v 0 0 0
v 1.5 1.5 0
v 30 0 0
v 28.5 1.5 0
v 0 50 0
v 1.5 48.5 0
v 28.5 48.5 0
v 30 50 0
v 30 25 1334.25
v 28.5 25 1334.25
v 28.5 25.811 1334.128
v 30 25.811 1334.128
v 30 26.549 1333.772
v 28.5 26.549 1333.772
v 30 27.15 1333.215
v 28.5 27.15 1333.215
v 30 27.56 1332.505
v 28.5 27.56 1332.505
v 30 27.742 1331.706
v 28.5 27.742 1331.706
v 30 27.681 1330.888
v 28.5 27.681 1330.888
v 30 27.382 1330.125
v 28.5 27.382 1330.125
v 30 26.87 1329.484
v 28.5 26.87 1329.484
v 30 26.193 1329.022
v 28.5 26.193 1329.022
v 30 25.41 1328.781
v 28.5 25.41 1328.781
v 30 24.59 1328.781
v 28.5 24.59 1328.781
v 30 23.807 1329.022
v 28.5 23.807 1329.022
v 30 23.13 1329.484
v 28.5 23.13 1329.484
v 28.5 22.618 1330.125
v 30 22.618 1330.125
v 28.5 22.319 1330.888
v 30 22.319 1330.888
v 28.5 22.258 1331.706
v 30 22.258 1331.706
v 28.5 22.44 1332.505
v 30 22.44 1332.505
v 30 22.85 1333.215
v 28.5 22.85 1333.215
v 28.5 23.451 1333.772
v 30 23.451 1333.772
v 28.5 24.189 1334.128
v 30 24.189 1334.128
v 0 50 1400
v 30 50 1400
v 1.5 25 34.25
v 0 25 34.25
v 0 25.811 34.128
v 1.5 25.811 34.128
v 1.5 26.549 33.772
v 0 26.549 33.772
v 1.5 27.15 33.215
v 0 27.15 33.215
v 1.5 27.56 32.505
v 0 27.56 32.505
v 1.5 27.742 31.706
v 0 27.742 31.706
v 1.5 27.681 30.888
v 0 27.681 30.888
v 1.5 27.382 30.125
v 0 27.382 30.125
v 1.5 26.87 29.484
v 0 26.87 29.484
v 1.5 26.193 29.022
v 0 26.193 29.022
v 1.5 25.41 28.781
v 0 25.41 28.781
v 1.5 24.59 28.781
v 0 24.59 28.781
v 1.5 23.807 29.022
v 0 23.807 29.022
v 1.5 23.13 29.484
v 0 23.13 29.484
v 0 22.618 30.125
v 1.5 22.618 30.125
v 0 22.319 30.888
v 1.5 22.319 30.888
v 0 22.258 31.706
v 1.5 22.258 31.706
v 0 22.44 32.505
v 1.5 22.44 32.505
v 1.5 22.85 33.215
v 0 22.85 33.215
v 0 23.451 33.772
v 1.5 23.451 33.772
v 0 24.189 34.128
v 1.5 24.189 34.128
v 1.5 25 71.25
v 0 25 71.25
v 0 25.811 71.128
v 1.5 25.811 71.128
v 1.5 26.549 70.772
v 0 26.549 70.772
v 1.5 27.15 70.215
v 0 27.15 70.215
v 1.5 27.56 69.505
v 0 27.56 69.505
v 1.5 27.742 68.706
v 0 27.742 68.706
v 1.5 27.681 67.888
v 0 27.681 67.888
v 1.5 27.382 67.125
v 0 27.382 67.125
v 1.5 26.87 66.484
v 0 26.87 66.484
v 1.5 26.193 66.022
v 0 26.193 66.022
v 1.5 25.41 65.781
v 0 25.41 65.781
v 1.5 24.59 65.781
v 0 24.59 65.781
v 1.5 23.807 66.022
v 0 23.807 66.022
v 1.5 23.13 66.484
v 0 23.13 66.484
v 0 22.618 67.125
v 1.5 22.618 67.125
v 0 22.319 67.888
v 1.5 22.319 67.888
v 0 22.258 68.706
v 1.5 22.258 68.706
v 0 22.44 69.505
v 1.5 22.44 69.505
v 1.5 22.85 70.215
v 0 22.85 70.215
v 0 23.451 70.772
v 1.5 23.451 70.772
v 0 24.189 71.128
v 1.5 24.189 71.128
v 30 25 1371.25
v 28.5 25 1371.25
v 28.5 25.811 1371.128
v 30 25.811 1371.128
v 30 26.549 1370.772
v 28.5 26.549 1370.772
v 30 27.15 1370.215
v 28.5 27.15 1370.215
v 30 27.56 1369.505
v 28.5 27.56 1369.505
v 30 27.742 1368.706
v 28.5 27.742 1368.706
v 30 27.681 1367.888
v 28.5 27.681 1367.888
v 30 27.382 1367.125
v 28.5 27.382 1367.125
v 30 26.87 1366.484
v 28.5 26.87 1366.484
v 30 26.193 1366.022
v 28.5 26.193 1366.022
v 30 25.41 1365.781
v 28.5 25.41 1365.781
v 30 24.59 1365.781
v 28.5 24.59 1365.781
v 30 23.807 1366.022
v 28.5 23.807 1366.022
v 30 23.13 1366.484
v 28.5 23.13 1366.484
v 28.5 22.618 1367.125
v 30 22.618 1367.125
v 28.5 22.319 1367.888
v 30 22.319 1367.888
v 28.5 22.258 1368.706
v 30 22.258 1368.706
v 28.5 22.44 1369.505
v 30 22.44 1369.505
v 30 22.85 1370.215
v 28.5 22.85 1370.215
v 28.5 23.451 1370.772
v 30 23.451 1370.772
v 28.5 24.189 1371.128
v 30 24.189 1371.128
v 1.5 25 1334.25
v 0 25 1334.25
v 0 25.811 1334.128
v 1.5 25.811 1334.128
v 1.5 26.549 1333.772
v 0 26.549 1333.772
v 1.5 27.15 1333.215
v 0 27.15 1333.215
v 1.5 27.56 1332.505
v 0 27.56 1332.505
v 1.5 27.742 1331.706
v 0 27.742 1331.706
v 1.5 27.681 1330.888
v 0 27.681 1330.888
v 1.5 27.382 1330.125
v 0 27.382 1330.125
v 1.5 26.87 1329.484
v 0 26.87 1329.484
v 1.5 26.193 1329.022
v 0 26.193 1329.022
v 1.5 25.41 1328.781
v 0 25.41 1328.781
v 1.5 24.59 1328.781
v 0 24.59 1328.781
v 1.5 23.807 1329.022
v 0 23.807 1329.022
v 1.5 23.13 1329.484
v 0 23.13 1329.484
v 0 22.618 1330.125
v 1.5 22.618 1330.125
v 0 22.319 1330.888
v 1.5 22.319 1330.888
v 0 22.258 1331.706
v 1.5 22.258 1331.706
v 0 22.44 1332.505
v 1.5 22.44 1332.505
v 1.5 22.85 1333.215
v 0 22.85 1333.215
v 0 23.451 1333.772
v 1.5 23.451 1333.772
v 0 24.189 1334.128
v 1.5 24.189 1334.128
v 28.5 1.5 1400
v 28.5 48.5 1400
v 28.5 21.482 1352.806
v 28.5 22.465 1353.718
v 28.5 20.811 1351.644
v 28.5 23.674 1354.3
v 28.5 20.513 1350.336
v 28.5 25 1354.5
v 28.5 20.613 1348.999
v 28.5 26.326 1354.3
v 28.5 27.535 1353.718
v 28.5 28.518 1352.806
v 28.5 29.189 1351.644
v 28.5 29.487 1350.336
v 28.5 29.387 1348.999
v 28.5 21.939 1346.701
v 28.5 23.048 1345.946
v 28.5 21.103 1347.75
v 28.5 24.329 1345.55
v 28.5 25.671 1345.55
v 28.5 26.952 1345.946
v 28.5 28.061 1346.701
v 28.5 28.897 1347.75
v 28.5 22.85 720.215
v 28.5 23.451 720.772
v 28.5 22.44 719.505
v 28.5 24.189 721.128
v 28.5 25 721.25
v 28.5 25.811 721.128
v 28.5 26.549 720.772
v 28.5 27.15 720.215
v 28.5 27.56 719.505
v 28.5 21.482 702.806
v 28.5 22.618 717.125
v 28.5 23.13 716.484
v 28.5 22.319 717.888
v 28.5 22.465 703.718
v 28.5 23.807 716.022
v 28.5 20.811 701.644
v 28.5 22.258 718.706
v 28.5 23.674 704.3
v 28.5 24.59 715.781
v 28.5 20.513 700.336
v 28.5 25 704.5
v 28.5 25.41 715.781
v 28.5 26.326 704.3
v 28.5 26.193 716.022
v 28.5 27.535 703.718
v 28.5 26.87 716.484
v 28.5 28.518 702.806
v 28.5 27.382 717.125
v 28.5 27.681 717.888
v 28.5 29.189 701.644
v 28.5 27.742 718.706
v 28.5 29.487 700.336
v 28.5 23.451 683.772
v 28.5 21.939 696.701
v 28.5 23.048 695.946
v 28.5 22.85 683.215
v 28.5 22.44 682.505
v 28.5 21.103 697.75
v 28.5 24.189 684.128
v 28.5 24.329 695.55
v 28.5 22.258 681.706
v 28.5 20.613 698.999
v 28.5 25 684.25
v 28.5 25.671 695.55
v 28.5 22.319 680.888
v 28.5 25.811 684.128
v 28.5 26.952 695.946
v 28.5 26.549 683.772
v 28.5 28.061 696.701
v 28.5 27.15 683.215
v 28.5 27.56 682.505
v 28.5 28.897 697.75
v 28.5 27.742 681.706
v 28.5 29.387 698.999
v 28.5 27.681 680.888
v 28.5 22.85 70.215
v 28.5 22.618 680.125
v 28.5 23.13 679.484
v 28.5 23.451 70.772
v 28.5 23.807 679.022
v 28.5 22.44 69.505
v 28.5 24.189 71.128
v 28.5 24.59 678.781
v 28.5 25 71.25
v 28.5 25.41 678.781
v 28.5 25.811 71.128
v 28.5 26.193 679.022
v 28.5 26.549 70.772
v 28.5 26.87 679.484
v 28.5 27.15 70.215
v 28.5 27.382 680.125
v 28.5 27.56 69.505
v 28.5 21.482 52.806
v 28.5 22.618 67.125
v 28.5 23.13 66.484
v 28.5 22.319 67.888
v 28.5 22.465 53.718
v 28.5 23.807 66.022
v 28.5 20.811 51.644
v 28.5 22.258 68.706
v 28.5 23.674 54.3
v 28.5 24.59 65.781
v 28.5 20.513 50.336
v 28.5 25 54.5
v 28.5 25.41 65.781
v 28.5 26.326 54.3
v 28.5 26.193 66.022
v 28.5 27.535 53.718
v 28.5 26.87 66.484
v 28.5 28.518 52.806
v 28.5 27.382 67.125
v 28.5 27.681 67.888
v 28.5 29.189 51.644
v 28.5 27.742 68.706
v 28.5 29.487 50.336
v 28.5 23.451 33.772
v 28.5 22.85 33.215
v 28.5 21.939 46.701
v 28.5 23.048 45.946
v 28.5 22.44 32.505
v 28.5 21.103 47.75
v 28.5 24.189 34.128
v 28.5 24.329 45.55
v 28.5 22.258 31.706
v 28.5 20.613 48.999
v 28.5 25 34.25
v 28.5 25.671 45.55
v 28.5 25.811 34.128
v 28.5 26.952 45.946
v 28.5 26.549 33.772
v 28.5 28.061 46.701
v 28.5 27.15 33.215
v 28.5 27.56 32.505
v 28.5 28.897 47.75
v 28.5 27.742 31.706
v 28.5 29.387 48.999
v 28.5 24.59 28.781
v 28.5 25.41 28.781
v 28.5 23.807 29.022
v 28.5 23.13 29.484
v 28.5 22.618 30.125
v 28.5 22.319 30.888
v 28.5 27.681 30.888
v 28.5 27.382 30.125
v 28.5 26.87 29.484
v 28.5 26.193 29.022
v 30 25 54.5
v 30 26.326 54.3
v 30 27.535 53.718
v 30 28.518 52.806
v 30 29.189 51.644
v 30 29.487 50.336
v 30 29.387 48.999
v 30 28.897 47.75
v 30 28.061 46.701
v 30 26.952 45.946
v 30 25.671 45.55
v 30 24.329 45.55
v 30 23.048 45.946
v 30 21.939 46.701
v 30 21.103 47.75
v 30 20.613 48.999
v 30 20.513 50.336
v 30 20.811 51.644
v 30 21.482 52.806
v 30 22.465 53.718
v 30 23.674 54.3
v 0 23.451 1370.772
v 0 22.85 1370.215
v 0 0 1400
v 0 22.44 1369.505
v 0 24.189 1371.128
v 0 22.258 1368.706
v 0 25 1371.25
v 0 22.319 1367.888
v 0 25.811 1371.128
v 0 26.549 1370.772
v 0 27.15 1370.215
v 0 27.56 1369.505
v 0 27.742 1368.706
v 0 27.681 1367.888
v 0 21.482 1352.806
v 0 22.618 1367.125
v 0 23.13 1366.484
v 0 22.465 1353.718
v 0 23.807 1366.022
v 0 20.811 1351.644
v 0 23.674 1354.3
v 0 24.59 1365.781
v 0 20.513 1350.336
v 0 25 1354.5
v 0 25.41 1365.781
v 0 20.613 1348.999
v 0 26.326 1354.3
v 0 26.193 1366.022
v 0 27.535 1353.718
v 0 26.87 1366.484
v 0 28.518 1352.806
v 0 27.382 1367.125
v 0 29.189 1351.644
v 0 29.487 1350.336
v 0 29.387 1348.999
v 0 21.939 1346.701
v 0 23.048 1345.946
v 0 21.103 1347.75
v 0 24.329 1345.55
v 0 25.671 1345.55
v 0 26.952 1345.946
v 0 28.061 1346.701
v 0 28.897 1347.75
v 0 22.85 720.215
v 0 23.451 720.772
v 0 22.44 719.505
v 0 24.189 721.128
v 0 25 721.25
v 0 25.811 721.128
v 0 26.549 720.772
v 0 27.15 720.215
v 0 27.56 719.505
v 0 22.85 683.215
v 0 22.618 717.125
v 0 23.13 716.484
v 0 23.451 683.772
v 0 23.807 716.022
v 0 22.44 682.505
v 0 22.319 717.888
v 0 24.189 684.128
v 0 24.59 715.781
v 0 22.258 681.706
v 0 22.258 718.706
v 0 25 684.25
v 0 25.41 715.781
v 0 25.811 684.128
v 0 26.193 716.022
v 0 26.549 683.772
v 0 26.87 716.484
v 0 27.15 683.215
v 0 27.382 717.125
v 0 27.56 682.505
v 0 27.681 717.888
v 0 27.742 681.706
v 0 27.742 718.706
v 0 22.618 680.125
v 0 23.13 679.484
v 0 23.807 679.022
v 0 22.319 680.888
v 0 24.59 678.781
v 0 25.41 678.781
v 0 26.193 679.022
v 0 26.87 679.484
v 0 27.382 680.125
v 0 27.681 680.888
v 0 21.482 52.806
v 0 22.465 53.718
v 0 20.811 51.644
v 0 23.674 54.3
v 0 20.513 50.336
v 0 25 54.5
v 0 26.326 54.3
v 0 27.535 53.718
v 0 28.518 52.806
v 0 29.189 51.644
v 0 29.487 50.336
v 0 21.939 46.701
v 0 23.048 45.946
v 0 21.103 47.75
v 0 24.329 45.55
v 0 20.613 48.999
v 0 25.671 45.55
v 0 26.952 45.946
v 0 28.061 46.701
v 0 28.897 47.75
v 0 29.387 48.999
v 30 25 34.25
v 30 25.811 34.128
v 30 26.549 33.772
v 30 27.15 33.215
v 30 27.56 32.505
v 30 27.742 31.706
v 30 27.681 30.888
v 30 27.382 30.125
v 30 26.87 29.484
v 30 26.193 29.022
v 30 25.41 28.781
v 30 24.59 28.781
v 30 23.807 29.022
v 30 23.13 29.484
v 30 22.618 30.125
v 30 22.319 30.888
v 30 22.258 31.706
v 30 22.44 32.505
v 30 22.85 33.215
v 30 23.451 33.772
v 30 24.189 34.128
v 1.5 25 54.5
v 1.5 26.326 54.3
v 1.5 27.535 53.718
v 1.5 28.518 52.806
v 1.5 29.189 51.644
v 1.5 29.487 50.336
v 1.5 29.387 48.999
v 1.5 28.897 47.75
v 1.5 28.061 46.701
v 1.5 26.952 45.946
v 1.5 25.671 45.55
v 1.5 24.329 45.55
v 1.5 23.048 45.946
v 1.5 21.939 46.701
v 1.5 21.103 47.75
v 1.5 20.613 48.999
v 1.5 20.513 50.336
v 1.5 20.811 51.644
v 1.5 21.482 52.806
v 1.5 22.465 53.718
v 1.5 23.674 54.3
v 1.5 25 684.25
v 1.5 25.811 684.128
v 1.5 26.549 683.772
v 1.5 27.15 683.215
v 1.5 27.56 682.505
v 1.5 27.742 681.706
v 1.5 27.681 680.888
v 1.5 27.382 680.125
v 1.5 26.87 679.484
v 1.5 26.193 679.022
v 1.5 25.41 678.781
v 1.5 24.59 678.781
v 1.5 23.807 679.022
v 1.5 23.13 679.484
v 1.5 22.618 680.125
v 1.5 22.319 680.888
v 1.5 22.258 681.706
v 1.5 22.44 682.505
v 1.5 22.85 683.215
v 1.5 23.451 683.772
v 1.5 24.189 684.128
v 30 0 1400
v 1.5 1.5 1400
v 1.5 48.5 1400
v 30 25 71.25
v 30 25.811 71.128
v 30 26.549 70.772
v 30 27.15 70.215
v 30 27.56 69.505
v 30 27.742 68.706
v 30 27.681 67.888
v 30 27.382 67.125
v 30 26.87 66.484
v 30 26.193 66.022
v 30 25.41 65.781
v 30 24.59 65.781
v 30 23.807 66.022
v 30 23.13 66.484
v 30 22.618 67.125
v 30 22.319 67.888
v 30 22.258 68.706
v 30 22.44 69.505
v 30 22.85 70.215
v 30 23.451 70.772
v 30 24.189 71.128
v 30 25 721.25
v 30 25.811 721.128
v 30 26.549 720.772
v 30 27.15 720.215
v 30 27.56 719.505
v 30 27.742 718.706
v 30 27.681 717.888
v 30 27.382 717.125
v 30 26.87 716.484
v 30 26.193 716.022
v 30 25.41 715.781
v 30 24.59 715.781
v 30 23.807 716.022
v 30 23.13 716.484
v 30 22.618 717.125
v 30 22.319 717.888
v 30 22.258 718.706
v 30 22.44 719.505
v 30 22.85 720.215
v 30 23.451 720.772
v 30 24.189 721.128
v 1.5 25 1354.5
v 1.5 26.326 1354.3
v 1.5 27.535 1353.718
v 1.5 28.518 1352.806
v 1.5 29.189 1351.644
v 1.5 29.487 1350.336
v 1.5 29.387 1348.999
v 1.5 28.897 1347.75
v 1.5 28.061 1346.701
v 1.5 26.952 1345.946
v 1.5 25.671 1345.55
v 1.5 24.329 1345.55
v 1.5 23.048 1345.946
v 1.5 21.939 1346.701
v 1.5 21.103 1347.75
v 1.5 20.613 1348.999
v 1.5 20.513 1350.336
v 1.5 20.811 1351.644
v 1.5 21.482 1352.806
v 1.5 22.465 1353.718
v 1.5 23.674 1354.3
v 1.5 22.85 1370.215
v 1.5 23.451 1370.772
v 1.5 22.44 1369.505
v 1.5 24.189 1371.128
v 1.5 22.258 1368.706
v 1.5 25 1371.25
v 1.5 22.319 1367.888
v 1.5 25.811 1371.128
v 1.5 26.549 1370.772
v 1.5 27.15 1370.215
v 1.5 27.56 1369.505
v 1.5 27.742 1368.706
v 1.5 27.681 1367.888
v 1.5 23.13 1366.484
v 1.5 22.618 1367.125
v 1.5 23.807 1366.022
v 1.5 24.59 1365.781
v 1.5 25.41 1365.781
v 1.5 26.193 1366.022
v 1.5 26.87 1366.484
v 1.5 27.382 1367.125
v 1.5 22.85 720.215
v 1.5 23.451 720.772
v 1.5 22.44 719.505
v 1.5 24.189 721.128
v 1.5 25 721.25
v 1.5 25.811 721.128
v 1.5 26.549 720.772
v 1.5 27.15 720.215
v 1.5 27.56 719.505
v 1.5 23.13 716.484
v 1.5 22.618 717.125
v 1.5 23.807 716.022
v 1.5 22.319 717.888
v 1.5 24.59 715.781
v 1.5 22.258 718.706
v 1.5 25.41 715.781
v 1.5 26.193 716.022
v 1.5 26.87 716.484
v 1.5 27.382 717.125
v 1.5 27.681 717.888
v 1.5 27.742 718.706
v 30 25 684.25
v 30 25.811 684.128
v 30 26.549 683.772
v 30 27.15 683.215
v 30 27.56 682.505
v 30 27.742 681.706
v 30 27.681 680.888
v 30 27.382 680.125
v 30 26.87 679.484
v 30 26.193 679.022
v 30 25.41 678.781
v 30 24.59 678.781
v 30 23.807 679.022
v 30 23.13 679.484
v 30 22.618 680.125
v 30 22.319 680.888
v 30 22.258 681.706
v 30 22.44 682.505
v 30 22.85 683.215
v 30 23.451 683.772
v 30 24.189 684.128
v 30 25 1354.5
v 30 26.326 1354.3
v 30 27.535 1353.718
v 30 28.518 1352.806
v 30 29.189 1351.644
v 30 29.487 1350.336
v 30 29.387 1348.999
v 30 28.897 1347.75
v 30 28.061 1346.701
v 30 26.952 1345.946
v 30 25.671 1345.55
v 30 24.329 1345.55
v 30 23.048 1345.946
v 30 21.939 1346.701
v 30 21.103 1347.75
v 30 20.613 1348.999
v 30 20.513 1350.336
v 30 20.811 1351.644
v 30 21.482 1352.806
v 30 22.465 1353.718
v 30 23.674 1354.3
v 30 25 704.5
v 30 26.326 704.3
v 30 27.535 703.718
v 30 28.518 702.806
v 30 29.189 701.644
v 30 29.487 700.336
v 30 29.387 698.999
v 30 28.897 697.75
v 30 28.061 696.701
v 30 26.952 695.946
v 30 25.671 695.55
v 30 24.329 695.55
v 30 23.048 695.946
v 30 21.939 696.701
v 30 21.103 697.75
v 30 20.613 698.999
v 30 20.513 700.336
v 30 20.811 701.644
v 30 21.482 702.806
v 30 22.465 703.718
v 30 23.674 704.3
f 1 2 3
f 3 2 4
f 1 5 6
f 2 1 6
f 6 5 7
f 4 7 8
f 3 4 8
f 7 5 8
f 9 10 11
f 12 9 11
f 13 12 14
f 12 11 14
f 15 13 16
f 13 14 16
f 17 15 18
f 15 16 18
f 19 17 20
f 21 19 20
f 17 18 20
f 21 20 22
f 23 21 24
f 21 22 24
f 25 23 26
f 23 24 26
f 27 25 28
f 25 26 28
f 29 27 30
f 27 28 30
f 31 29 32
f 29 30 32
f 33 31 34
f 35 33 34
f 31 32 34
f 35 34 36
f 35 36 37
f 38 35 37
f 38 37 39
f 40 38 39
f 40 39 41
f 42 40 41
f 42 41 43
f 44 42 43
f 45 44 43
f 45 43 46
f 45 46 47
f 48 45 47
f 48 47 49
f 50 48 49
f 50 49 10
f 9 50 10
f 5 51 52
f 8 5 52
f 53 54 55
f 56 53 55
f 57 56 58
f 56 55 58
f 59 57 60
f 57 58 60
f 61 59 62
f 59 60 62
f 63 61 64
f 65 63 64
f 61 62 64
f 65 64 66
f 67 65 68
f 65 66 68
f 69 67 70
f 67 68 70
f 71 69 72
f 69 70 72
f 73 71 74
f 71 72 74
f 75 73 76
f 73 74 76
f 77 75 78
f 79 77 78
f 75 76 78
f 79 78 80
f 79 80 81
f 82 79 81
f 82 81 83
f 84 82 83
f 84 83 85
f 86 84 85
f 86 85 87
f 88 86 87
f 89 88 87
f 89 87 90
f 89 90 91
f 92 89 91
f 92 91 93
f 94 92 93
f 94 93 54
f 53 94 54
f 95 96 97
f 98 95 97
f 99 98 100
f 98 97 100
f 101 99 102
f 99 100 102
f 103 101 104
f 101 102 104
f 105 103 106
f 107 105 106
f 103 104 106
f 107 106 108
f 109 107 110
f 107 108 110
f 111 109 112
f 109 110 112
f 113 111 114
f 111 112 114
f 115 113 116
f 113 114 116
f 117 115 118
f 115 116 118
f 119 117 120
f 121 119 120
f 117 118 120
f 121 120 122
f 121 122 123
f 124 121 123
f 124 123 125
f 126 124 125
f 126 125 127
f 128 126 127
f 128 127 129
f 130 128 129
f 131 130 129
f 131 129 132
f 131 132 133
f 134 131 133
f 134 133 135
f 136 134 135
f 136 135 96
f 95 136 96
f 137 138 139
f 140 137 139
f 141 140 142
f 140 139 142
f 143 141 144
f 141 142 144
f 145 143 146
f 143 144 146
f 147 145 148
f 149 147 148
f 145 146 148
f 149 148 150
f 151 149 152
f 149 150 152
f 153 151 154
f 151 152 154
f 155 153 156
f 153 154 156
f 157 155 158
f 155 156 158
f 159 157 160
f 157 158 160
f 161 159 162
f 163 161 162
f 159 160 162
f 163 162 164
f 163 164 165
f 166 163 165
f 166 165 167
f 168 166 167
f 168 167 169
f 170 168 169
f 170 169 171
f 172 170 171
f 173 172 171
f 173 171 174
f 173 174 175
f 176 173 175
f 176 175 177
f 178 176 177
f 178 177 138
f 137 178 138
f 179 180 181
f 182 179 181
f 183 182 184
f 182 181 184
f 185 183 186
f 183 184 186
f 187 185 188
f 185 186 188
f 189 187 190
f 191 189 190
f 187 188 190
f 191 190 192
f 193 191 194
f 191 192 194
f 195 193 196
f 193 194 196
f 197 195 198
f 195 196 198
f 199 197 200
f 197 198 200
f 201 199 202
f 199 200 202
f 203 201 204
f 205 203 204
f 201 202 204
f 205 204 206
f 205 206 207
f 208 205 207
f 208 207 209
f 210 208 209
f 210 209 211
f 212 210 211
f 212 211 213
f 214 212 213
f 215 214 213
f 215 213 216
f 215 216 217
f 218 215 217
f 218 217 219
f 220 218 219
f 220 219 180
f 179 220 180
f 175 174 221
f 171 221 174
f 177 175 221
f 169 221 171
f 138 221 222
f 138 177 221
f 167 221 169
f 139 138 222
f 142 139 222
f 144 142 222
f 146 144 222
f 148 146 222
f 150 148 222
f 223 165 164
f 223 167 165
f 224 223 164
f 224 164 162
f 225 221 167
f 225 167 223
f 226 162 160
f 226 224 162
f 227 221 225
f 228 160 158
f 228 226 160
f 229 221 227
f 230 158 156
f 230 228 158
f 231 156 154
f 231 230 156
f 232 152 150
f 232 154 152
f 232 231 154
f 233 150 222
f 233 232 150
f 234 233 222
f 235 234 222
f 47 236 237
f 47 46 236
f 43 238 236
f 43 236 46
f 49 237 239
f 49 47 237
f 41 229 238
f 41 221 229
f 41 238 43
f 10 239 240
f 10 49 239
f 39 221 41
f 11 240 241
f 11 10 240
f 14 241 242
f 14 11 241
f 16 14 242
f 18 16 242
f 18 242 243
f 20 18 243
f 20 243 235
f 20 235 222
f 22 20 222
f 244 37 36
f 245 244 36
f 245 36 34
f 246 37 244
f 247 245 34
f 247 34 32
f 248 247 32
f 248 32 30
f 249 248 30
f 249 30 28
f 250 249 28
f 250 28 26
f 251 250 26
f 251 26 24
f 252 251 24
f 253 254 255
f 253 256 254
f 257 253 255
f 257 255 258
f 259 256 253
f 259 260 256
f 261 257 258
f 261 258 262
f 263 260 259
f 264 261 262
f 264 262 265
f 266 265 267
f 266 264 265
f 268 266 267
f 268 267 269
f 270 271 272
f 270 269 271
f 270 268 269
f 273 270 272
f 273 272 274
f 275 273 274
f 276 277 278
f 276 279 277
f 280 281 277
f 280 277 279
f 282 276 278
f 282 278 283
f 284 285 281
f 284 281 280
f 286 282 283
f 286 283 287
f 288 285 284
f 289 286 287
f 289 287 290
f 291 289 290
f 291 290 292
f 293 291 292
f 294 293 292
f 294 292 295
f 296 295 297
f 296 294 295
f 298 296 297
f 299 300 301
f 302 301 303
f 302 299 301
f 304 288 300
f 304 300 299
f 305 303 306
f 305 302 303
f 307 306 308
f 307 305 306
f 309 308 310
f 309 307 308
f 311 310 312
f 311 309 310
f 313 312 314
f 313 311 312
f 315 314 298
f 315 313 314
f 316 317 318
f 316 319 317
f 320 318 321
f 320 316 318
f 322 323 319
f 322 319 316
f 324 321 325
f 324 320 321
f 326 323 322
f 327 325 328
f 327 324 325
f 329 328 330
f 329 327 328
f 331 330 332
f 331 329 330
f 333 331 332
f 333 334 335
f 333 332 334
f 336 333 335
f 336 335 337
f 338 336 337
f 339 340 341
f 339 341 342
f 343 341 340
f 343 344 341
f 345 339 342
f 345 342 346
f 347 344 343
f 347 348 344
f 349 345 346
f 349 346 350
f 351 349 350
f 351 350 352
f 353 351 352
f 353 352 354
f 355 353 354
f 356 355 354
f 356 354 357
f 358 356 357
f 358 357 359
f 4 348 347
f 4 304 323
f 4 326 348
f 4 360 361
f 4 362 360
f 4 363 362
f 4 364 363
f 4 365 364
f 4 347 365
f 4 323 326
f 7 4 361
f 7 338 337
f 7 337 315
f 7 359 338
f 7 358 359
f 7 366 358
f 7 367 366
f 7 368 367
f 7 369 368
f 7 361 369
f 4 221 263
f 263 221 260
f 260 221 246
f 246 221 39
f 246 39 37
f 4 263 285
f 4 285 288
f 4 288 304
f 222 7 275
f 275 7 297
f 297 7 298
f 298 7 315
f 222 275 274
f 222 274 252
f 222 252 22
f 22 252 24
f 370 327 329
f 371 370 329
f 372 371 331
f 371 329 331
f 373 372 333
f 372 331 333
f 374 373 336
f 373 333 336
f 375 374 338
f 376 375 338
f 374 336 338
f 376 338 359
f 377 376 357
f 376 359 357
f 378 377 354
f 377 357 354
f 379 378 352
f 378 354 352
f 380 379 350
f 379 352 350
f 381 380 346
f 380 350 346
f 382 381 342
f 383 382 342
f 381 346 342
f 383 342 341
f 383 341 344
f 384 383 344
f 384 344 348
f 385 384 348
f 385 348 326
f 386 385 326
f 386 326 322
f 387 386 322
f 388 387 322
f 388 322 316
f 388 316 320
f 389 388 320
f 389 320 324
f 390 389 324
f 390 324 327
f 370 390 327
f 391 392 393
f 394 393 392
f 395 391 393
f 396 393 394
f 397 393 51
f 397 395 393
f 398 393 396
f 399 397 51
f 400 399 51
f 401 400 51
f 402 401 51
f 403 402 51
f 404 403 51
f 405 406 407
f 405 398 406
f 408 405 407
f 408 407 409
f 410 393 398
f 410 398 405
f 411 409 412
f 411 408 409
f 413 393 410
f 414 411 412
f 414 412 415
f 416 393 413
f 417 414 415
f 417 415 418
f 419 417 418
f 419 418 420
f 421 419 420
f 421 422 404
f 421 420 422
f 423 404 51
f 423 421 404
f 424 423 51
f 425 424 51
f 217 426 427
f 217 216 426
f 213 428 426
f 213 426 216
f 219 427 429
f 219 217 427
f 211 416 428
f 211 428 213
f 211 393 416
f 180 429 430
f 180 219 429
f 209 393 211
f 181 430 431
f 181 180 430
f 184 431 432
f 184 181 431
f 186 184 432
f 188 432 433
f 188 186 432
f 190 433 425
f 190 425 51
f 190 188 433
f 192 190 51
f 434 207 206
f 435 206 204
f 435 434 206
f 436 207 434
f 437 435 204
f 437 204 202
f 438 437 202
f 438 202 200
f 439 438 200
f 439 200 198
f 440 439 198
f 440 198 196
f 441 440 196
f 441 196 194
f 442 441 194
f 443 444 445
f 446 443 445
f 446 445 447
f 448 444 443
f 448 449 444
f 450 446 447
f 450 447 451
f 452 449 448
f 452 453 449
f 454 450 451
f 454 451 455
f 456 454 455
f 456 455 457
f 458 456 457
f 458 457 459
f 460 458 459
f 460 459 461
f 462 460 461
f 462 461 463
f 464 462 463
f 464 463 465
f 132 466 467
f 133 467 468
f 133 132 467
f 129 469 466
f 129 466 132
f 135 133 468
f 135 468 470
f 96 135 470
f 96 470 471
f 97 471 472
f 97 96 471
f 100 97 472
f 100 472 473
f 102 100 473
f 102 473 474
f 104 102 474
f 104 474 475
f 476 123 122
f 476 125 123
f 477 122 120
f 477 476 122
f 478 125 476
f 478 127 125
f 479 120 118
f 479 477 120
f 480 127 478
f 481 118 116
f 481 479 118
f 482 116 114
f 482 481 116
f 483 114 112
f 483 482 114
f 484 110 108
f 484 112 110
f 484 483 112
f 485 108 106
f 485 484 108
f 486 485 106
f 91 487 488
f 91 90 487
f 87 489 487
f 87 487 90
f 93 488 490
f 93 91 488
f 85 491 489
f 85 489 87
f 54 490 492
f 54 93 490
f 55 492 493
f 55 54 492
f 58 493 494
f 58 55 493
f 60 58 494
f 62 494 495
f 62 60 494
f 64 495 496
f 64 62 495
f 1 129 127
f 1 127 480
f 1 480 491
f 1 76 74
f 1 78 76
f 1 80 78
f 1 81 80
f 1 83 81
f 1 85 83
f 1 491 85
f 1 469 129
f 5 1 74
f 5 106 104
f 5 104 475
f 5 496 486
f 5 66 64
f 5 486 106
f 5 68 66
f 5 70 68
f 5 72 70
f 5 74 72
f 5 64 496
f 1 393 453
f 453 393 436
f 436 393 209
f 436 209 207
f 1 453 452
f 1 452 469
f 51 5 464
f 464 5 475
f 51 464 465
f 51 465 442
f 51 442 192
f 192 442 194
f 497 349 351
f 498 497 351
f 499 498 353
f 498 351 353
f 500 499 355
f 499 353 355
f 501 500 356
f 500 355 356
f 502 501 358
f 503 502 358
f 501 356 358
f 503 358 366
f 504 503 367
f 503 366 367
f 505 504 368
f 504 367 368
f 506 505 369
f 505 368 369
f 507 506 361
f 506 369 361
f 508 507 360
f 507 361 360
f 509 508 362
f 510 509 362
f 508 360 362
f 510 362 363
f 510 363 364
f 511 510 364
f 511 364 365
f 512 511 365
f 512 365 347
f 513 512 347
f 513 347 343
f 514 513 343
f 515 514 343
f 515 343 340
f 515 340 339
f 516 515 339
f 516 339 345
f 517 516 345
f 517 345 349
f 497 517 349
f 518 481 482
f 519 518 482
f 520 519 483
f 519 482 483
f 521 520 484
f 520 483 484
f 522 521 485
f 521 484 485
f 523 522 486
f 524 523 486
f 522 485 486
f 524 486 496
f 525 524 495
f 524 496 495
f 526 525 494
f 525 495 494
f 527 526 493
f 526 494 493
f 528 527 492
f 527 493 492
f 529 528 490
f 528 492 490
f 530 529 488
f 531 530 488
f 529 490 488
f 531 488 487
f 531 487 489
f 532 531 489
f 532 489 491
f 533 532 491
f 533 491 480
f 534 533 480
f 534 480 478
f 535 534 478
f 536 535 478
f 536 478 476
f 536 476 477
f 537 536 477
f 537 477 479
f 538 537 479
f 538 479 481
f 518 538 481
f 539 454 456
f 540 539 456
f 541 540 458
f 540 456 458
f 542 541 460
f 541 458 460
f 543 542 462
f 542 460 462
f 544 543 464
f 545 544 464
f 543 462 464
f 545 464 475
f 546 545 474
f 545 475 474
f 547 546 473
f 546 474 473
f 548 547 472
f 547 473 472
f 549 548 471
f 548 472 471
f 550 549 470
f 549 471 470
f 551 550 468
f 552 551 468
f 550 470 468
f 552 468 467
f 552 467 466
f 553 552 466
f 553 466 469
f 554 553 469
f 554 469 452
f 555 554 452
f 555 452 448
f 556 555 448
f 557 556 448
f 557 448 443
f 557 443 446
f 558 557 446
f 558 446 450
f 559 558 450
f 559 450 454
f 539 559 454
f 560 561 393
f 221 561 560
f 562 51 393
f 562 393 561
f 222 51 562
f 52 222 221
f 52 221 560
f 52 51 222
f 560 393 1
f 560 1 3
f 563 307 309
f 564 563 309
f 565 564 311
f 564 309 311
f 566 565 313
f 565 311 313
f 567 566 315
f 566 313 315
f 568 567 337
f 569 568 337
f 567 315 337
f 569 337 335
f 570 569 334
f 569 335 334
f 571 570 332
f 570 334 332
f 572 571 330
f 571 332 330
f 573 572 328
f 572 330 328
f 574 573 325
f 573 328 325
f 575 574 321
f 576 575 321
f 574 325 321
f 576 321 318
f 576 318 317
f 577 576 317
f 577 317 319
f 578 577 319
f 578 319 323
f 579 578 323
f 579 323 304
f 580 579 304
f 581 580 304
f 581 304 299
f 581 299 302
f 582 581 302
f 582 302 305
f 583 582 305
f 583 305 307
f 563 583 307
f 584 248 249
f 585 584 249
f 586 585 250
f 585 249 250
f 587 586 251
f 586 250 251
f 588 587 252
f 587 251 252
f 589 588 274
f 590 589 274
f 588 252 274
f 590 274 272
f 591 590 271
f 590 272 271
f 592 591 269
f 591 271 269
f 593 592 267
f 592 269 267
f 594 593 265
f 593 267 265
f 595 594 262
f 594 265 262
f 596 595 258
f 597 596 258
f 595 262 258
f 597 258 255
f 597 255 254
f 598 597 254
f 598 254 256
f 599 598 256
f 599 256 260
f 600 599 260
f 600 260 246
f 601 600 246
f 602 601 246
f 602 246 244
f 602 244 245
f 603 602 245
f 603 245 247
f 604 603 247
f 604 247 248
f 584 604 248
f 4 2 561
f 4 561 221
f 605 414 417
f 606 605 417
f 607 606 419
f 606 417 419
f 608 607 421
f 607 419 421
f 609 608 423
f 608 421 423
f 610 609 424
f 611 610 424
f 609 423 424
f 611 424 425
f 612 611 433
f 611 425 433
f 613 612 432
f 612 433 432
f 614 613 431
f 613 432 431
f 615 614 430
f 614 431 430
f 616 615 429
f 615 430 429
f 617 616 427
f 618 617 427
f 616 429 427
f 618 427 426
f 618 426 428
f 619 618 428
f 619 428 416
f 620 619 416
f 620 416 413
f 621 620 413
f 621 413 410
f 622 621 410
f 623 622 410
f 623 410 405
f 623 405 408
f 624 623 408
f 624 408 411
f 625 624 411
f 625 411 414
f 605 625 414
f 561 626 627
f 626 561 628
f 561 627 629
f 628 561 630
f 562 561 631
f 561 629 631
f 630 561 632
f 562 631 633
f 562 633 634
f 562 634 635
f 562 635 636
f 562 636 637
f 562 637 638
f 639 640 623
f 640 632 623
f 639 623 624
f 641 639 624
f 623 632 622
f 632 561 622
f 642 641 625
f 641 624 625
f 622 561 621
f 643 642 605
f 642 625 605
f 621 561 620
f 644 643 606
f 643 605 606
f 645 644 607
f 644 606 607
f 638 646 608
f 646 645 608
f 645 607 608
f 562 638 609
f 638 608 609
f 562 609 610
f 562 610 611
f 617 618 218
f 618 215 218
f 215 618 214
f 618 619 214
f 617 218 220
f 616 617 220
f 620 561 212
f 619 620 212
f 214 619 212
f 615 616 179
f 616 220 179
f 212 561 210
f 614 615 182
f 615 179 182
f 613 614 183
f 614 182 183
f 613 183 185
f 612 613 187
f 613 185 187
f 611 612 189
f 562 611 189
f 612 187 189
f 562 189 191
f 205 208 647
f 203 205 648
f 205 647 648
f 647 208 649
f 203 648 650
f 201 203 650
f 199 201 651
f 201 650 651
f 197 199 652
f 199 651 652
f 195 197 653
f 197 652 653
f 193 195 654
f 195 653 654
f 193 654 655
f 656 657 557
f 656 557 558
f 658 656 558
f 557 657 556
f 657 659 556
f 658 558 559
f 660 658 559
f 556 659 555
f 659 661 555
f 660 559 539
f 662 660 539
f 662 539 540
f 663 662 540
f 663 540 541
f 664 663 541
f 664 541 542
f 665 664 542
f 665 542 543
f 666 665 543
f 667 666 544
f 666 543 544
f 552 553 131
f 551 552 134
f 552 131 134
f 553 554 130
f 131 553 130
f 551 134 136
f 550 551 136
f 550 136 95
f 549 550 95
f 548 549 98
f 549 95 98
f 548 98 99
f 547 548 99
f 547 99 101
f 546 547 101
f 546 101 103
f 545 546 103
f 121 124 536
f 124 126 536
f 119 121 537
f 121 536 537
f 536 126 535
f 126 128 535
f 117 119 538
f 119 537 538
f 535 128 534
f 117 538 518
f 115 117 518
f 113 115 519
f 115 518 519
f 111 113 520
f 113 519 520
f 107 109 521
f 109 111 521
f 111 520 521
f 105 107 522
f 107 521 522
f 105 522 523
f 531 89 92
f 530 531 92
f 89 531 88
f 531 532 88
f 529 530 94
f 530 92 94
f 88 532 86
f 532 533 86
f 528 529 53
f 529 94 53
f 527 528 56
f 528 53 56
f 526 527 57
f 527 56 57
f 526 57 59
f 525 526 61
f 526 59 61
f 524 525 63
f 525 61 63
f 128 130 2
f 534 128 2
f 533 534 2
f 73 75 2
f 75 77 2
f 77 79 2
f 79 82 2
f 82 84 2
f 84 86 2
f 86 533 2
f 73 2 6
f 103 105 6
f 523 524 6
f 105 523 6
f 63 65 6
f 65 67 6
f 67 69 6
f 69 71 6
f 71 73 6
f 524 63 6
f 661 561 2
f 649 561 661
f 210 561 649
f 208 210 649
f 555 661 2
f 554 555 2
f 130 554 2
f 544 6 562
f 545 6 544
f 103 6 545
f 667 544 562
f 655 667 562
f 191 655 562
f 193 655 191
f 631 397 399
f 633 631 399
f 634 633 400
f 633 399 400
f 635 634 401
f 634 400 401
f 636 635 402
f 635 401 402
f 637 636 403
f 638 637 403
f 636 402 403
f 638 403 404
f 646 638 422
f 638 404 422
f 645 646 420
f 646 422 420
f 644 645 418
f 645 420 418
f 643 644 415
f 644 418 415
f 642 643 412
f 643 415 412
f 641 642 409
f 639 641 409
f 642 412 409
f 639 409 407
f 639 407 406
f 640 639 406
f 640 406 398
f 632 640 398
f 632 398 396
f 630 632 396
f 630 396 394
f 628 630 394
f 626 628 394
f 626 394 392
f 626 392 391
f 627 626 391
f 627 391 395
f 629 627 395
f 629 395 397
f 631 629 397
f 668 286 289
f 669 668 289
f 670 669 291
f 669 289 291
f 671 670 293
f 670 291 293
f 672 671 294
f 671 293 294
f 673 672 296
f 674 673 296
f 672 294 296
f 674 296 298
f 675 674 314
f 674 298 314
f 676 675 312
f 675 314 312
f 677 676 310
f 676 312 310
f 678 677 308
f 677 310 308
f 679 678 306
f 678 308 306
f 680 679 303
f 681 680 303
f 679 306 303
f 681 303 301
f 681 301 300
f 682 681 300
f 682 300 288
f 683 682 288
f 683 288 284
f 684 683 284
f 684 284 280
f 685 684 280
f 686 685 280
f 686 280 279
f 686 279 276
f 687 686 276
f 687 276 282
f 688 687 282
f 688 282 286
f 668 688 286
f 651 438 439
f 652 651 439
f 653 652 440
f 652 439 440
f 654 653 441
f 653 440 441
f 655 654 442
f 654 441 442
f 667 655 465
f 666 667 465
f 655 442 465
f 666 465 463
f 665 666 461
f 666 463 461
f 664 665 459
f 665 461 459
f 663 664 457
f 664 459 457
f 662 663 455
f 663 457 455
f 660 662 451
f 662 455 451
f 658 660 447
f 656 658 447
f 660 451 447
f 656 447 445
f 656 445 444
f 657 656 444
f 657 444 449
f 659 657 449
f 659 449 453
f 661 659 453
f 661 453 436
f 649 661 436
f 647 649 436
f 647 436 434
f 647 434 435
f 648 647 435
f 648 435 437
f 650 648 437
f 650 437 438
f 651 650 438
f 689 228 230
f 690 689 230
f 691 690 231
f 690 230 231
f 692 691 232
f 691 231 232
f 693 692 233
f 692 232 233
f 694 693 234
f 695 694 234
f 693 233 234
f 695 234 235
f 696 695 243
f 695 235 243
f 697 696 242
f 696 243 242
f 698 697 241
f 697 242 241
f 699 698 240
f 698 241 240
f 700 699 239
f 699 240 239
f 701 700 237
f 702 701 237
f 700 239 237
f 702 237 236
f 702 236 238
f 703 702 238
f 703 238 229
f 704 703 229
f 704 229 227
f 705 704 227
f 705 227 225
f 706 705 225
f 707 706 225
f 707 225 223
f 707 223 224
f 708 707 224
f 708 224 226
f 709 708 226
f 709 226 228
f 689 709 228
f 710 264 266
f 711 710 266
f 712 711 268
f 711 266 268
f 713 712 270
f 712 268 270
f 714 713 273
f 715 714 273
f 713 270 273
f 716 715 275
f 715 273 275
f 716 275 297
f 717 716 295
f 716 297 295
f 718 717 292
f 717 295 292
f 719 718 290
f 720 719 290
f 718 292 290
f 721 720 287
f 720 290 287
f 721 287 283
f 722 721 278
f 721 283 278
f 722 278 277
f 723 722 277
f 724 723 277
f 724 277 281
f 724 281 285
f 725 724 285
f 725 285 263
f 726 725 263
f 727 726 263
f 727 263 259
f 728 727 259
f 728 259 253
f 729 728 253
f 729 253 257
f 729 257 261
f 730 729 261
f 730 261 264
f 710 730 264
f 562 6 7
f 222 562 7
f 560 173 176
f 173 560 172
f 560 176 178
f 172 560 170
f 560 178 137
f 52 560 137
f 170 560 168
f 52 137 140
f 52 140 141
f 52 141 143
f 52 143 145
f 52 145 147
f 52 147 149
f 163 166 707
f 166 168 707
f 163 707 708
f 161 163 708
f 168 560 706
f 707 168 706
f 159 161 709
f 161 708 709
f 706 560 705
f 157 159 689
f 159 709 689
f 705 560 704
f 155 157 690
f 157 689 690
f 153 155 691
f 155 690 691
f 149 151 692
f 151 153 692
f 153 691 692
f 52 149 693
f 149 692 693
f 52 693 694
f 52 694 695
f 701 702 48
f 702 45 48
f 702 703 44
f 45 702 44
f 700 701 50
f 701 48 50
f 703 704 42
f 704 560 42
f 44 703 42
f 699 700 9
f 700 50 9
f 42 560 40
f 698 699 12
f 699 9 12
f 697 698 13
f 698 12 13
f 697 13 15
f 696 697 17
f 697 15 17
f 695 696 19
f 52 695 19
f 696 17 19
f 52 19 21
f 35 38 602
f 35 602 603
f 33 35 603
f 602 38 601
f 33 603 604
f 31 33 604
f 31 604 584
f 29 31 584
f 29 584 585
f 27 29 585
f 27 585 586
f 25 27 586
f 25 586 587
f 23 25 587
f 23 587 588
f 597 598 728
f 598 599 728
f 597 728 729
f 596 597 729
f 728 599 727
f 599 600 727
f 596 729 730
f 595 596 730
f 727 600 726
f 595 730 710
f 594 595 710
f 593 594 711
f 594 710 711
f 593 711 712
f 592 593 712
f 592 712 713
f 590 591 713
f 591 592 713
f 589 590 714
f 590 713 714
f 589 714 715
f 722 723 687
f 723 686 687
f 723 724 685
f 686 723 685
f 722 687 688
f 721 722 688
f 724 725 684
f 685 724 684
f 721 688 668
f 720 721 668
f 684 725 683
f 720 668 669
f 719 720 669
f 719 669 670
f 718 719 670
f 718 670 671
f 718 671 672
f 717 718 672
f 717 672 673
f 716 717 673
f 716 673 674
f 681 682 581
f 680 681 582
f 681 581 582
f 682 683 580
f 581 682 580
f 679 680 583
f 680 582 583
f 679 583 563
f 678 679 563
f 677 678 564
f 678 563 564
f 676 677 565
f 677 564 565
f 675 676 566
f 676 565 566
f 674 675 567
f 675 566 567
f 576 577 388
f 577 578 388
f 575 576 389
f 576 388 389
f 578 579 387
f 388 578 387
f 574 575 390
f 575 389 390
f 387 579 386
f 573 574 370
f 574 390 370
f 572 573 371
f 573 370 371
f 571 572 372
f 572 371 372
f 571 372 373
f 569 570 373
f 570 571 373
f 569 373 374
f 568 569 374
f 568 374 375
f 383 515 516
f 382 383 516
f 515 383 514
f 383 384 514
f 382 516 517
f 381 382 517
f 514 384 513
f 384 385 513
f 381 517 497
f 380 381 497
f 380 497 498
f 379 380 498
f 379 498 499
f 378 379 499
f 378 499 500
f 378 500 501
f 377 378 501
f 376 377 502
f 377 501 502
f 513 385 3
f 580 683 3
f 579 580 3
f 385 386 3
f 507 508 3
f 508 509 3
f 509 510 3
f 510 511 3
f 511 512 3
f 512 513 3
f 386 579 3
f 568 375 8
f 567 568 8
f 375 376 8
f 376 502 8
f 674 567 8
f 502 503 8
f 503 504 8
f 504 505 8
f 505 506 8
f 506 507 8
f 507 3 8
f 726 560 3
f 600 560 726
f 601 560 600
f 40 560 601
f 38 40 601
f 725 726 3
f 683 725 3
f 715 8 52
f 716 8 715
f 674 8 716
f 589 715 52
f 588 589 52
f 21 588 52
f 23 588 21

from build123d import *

# Parameters (mm, degrees)
ESBO_O1_W                   = 30
ESBO_O1_H                   = 50
ESBO_O1_W_2                 = 27
ESBO_O1_H_2                 = 47
RESSALTO_EXTRUS_O1_DEPTH    = 1400
FURO_COM_FOLGA_DE_M52_D     = 5.5
FURO_COM_FOLGA_DE_M81_D     = 9
FURO_COM_FOLGA_DE_M84_D     = 9
FURO_COM_FOLGA_DE_M84_DEPTH = 1.5


with BuildPart() as part:
    # Esboço1 → Ressalto-extrusão1 (new body)
    with BuildSketch(Plane.XY):
        with Locations((15, 25)):
            Rectangle(ESBO_O1_W, ESBO_O1_H)
        with Locations((15, 25)):
            Rectangle(ESBO_O1_W_2, ESBO_O1_H_2, mode=Mode.SUBTRACT)
    extrude(amount=RESSALTO_EXTRUS_O1_DEPTH)

    # Furo com folga de M52 (through all)
    with Locations(Plane(origin=(30, 0, 0), x_dir=(0, 0, -1), z_dir=(1, 0, 0))):
        with Locations((-1368.5, 25), (-1331.5, 25), (-68.5, 25), (-31.5, 25), (-718.5, 25), (-681.5, 25)):
            Hole(FURO_COM_FOLGA_DE_M52_D / 2)

    # Furo com folga de M81 (through all)
    with Locations(Plane(origin=(30, 0, 0), x_dir=(0, 0, -1), z_dir=(1, 0, 0))):
        with Locations((-1350, 25), (-50, 25)):
            Hole(FURO_COM_FOLGA_DE_M81_D / 2)

    # Furo com folga de M84
    with Locations(Plane(origin=(30, 0, 0), x_dir=(0, 0, -1), z_dir=(1, 0, 0))):
        with Locations((-700, 25)):
            Hole(FURO_COM_FOLGA_DE_M84_D / 2, depth=FURO_COM_FOLGA_DE_M84_DEPTH)


solid = part.part
